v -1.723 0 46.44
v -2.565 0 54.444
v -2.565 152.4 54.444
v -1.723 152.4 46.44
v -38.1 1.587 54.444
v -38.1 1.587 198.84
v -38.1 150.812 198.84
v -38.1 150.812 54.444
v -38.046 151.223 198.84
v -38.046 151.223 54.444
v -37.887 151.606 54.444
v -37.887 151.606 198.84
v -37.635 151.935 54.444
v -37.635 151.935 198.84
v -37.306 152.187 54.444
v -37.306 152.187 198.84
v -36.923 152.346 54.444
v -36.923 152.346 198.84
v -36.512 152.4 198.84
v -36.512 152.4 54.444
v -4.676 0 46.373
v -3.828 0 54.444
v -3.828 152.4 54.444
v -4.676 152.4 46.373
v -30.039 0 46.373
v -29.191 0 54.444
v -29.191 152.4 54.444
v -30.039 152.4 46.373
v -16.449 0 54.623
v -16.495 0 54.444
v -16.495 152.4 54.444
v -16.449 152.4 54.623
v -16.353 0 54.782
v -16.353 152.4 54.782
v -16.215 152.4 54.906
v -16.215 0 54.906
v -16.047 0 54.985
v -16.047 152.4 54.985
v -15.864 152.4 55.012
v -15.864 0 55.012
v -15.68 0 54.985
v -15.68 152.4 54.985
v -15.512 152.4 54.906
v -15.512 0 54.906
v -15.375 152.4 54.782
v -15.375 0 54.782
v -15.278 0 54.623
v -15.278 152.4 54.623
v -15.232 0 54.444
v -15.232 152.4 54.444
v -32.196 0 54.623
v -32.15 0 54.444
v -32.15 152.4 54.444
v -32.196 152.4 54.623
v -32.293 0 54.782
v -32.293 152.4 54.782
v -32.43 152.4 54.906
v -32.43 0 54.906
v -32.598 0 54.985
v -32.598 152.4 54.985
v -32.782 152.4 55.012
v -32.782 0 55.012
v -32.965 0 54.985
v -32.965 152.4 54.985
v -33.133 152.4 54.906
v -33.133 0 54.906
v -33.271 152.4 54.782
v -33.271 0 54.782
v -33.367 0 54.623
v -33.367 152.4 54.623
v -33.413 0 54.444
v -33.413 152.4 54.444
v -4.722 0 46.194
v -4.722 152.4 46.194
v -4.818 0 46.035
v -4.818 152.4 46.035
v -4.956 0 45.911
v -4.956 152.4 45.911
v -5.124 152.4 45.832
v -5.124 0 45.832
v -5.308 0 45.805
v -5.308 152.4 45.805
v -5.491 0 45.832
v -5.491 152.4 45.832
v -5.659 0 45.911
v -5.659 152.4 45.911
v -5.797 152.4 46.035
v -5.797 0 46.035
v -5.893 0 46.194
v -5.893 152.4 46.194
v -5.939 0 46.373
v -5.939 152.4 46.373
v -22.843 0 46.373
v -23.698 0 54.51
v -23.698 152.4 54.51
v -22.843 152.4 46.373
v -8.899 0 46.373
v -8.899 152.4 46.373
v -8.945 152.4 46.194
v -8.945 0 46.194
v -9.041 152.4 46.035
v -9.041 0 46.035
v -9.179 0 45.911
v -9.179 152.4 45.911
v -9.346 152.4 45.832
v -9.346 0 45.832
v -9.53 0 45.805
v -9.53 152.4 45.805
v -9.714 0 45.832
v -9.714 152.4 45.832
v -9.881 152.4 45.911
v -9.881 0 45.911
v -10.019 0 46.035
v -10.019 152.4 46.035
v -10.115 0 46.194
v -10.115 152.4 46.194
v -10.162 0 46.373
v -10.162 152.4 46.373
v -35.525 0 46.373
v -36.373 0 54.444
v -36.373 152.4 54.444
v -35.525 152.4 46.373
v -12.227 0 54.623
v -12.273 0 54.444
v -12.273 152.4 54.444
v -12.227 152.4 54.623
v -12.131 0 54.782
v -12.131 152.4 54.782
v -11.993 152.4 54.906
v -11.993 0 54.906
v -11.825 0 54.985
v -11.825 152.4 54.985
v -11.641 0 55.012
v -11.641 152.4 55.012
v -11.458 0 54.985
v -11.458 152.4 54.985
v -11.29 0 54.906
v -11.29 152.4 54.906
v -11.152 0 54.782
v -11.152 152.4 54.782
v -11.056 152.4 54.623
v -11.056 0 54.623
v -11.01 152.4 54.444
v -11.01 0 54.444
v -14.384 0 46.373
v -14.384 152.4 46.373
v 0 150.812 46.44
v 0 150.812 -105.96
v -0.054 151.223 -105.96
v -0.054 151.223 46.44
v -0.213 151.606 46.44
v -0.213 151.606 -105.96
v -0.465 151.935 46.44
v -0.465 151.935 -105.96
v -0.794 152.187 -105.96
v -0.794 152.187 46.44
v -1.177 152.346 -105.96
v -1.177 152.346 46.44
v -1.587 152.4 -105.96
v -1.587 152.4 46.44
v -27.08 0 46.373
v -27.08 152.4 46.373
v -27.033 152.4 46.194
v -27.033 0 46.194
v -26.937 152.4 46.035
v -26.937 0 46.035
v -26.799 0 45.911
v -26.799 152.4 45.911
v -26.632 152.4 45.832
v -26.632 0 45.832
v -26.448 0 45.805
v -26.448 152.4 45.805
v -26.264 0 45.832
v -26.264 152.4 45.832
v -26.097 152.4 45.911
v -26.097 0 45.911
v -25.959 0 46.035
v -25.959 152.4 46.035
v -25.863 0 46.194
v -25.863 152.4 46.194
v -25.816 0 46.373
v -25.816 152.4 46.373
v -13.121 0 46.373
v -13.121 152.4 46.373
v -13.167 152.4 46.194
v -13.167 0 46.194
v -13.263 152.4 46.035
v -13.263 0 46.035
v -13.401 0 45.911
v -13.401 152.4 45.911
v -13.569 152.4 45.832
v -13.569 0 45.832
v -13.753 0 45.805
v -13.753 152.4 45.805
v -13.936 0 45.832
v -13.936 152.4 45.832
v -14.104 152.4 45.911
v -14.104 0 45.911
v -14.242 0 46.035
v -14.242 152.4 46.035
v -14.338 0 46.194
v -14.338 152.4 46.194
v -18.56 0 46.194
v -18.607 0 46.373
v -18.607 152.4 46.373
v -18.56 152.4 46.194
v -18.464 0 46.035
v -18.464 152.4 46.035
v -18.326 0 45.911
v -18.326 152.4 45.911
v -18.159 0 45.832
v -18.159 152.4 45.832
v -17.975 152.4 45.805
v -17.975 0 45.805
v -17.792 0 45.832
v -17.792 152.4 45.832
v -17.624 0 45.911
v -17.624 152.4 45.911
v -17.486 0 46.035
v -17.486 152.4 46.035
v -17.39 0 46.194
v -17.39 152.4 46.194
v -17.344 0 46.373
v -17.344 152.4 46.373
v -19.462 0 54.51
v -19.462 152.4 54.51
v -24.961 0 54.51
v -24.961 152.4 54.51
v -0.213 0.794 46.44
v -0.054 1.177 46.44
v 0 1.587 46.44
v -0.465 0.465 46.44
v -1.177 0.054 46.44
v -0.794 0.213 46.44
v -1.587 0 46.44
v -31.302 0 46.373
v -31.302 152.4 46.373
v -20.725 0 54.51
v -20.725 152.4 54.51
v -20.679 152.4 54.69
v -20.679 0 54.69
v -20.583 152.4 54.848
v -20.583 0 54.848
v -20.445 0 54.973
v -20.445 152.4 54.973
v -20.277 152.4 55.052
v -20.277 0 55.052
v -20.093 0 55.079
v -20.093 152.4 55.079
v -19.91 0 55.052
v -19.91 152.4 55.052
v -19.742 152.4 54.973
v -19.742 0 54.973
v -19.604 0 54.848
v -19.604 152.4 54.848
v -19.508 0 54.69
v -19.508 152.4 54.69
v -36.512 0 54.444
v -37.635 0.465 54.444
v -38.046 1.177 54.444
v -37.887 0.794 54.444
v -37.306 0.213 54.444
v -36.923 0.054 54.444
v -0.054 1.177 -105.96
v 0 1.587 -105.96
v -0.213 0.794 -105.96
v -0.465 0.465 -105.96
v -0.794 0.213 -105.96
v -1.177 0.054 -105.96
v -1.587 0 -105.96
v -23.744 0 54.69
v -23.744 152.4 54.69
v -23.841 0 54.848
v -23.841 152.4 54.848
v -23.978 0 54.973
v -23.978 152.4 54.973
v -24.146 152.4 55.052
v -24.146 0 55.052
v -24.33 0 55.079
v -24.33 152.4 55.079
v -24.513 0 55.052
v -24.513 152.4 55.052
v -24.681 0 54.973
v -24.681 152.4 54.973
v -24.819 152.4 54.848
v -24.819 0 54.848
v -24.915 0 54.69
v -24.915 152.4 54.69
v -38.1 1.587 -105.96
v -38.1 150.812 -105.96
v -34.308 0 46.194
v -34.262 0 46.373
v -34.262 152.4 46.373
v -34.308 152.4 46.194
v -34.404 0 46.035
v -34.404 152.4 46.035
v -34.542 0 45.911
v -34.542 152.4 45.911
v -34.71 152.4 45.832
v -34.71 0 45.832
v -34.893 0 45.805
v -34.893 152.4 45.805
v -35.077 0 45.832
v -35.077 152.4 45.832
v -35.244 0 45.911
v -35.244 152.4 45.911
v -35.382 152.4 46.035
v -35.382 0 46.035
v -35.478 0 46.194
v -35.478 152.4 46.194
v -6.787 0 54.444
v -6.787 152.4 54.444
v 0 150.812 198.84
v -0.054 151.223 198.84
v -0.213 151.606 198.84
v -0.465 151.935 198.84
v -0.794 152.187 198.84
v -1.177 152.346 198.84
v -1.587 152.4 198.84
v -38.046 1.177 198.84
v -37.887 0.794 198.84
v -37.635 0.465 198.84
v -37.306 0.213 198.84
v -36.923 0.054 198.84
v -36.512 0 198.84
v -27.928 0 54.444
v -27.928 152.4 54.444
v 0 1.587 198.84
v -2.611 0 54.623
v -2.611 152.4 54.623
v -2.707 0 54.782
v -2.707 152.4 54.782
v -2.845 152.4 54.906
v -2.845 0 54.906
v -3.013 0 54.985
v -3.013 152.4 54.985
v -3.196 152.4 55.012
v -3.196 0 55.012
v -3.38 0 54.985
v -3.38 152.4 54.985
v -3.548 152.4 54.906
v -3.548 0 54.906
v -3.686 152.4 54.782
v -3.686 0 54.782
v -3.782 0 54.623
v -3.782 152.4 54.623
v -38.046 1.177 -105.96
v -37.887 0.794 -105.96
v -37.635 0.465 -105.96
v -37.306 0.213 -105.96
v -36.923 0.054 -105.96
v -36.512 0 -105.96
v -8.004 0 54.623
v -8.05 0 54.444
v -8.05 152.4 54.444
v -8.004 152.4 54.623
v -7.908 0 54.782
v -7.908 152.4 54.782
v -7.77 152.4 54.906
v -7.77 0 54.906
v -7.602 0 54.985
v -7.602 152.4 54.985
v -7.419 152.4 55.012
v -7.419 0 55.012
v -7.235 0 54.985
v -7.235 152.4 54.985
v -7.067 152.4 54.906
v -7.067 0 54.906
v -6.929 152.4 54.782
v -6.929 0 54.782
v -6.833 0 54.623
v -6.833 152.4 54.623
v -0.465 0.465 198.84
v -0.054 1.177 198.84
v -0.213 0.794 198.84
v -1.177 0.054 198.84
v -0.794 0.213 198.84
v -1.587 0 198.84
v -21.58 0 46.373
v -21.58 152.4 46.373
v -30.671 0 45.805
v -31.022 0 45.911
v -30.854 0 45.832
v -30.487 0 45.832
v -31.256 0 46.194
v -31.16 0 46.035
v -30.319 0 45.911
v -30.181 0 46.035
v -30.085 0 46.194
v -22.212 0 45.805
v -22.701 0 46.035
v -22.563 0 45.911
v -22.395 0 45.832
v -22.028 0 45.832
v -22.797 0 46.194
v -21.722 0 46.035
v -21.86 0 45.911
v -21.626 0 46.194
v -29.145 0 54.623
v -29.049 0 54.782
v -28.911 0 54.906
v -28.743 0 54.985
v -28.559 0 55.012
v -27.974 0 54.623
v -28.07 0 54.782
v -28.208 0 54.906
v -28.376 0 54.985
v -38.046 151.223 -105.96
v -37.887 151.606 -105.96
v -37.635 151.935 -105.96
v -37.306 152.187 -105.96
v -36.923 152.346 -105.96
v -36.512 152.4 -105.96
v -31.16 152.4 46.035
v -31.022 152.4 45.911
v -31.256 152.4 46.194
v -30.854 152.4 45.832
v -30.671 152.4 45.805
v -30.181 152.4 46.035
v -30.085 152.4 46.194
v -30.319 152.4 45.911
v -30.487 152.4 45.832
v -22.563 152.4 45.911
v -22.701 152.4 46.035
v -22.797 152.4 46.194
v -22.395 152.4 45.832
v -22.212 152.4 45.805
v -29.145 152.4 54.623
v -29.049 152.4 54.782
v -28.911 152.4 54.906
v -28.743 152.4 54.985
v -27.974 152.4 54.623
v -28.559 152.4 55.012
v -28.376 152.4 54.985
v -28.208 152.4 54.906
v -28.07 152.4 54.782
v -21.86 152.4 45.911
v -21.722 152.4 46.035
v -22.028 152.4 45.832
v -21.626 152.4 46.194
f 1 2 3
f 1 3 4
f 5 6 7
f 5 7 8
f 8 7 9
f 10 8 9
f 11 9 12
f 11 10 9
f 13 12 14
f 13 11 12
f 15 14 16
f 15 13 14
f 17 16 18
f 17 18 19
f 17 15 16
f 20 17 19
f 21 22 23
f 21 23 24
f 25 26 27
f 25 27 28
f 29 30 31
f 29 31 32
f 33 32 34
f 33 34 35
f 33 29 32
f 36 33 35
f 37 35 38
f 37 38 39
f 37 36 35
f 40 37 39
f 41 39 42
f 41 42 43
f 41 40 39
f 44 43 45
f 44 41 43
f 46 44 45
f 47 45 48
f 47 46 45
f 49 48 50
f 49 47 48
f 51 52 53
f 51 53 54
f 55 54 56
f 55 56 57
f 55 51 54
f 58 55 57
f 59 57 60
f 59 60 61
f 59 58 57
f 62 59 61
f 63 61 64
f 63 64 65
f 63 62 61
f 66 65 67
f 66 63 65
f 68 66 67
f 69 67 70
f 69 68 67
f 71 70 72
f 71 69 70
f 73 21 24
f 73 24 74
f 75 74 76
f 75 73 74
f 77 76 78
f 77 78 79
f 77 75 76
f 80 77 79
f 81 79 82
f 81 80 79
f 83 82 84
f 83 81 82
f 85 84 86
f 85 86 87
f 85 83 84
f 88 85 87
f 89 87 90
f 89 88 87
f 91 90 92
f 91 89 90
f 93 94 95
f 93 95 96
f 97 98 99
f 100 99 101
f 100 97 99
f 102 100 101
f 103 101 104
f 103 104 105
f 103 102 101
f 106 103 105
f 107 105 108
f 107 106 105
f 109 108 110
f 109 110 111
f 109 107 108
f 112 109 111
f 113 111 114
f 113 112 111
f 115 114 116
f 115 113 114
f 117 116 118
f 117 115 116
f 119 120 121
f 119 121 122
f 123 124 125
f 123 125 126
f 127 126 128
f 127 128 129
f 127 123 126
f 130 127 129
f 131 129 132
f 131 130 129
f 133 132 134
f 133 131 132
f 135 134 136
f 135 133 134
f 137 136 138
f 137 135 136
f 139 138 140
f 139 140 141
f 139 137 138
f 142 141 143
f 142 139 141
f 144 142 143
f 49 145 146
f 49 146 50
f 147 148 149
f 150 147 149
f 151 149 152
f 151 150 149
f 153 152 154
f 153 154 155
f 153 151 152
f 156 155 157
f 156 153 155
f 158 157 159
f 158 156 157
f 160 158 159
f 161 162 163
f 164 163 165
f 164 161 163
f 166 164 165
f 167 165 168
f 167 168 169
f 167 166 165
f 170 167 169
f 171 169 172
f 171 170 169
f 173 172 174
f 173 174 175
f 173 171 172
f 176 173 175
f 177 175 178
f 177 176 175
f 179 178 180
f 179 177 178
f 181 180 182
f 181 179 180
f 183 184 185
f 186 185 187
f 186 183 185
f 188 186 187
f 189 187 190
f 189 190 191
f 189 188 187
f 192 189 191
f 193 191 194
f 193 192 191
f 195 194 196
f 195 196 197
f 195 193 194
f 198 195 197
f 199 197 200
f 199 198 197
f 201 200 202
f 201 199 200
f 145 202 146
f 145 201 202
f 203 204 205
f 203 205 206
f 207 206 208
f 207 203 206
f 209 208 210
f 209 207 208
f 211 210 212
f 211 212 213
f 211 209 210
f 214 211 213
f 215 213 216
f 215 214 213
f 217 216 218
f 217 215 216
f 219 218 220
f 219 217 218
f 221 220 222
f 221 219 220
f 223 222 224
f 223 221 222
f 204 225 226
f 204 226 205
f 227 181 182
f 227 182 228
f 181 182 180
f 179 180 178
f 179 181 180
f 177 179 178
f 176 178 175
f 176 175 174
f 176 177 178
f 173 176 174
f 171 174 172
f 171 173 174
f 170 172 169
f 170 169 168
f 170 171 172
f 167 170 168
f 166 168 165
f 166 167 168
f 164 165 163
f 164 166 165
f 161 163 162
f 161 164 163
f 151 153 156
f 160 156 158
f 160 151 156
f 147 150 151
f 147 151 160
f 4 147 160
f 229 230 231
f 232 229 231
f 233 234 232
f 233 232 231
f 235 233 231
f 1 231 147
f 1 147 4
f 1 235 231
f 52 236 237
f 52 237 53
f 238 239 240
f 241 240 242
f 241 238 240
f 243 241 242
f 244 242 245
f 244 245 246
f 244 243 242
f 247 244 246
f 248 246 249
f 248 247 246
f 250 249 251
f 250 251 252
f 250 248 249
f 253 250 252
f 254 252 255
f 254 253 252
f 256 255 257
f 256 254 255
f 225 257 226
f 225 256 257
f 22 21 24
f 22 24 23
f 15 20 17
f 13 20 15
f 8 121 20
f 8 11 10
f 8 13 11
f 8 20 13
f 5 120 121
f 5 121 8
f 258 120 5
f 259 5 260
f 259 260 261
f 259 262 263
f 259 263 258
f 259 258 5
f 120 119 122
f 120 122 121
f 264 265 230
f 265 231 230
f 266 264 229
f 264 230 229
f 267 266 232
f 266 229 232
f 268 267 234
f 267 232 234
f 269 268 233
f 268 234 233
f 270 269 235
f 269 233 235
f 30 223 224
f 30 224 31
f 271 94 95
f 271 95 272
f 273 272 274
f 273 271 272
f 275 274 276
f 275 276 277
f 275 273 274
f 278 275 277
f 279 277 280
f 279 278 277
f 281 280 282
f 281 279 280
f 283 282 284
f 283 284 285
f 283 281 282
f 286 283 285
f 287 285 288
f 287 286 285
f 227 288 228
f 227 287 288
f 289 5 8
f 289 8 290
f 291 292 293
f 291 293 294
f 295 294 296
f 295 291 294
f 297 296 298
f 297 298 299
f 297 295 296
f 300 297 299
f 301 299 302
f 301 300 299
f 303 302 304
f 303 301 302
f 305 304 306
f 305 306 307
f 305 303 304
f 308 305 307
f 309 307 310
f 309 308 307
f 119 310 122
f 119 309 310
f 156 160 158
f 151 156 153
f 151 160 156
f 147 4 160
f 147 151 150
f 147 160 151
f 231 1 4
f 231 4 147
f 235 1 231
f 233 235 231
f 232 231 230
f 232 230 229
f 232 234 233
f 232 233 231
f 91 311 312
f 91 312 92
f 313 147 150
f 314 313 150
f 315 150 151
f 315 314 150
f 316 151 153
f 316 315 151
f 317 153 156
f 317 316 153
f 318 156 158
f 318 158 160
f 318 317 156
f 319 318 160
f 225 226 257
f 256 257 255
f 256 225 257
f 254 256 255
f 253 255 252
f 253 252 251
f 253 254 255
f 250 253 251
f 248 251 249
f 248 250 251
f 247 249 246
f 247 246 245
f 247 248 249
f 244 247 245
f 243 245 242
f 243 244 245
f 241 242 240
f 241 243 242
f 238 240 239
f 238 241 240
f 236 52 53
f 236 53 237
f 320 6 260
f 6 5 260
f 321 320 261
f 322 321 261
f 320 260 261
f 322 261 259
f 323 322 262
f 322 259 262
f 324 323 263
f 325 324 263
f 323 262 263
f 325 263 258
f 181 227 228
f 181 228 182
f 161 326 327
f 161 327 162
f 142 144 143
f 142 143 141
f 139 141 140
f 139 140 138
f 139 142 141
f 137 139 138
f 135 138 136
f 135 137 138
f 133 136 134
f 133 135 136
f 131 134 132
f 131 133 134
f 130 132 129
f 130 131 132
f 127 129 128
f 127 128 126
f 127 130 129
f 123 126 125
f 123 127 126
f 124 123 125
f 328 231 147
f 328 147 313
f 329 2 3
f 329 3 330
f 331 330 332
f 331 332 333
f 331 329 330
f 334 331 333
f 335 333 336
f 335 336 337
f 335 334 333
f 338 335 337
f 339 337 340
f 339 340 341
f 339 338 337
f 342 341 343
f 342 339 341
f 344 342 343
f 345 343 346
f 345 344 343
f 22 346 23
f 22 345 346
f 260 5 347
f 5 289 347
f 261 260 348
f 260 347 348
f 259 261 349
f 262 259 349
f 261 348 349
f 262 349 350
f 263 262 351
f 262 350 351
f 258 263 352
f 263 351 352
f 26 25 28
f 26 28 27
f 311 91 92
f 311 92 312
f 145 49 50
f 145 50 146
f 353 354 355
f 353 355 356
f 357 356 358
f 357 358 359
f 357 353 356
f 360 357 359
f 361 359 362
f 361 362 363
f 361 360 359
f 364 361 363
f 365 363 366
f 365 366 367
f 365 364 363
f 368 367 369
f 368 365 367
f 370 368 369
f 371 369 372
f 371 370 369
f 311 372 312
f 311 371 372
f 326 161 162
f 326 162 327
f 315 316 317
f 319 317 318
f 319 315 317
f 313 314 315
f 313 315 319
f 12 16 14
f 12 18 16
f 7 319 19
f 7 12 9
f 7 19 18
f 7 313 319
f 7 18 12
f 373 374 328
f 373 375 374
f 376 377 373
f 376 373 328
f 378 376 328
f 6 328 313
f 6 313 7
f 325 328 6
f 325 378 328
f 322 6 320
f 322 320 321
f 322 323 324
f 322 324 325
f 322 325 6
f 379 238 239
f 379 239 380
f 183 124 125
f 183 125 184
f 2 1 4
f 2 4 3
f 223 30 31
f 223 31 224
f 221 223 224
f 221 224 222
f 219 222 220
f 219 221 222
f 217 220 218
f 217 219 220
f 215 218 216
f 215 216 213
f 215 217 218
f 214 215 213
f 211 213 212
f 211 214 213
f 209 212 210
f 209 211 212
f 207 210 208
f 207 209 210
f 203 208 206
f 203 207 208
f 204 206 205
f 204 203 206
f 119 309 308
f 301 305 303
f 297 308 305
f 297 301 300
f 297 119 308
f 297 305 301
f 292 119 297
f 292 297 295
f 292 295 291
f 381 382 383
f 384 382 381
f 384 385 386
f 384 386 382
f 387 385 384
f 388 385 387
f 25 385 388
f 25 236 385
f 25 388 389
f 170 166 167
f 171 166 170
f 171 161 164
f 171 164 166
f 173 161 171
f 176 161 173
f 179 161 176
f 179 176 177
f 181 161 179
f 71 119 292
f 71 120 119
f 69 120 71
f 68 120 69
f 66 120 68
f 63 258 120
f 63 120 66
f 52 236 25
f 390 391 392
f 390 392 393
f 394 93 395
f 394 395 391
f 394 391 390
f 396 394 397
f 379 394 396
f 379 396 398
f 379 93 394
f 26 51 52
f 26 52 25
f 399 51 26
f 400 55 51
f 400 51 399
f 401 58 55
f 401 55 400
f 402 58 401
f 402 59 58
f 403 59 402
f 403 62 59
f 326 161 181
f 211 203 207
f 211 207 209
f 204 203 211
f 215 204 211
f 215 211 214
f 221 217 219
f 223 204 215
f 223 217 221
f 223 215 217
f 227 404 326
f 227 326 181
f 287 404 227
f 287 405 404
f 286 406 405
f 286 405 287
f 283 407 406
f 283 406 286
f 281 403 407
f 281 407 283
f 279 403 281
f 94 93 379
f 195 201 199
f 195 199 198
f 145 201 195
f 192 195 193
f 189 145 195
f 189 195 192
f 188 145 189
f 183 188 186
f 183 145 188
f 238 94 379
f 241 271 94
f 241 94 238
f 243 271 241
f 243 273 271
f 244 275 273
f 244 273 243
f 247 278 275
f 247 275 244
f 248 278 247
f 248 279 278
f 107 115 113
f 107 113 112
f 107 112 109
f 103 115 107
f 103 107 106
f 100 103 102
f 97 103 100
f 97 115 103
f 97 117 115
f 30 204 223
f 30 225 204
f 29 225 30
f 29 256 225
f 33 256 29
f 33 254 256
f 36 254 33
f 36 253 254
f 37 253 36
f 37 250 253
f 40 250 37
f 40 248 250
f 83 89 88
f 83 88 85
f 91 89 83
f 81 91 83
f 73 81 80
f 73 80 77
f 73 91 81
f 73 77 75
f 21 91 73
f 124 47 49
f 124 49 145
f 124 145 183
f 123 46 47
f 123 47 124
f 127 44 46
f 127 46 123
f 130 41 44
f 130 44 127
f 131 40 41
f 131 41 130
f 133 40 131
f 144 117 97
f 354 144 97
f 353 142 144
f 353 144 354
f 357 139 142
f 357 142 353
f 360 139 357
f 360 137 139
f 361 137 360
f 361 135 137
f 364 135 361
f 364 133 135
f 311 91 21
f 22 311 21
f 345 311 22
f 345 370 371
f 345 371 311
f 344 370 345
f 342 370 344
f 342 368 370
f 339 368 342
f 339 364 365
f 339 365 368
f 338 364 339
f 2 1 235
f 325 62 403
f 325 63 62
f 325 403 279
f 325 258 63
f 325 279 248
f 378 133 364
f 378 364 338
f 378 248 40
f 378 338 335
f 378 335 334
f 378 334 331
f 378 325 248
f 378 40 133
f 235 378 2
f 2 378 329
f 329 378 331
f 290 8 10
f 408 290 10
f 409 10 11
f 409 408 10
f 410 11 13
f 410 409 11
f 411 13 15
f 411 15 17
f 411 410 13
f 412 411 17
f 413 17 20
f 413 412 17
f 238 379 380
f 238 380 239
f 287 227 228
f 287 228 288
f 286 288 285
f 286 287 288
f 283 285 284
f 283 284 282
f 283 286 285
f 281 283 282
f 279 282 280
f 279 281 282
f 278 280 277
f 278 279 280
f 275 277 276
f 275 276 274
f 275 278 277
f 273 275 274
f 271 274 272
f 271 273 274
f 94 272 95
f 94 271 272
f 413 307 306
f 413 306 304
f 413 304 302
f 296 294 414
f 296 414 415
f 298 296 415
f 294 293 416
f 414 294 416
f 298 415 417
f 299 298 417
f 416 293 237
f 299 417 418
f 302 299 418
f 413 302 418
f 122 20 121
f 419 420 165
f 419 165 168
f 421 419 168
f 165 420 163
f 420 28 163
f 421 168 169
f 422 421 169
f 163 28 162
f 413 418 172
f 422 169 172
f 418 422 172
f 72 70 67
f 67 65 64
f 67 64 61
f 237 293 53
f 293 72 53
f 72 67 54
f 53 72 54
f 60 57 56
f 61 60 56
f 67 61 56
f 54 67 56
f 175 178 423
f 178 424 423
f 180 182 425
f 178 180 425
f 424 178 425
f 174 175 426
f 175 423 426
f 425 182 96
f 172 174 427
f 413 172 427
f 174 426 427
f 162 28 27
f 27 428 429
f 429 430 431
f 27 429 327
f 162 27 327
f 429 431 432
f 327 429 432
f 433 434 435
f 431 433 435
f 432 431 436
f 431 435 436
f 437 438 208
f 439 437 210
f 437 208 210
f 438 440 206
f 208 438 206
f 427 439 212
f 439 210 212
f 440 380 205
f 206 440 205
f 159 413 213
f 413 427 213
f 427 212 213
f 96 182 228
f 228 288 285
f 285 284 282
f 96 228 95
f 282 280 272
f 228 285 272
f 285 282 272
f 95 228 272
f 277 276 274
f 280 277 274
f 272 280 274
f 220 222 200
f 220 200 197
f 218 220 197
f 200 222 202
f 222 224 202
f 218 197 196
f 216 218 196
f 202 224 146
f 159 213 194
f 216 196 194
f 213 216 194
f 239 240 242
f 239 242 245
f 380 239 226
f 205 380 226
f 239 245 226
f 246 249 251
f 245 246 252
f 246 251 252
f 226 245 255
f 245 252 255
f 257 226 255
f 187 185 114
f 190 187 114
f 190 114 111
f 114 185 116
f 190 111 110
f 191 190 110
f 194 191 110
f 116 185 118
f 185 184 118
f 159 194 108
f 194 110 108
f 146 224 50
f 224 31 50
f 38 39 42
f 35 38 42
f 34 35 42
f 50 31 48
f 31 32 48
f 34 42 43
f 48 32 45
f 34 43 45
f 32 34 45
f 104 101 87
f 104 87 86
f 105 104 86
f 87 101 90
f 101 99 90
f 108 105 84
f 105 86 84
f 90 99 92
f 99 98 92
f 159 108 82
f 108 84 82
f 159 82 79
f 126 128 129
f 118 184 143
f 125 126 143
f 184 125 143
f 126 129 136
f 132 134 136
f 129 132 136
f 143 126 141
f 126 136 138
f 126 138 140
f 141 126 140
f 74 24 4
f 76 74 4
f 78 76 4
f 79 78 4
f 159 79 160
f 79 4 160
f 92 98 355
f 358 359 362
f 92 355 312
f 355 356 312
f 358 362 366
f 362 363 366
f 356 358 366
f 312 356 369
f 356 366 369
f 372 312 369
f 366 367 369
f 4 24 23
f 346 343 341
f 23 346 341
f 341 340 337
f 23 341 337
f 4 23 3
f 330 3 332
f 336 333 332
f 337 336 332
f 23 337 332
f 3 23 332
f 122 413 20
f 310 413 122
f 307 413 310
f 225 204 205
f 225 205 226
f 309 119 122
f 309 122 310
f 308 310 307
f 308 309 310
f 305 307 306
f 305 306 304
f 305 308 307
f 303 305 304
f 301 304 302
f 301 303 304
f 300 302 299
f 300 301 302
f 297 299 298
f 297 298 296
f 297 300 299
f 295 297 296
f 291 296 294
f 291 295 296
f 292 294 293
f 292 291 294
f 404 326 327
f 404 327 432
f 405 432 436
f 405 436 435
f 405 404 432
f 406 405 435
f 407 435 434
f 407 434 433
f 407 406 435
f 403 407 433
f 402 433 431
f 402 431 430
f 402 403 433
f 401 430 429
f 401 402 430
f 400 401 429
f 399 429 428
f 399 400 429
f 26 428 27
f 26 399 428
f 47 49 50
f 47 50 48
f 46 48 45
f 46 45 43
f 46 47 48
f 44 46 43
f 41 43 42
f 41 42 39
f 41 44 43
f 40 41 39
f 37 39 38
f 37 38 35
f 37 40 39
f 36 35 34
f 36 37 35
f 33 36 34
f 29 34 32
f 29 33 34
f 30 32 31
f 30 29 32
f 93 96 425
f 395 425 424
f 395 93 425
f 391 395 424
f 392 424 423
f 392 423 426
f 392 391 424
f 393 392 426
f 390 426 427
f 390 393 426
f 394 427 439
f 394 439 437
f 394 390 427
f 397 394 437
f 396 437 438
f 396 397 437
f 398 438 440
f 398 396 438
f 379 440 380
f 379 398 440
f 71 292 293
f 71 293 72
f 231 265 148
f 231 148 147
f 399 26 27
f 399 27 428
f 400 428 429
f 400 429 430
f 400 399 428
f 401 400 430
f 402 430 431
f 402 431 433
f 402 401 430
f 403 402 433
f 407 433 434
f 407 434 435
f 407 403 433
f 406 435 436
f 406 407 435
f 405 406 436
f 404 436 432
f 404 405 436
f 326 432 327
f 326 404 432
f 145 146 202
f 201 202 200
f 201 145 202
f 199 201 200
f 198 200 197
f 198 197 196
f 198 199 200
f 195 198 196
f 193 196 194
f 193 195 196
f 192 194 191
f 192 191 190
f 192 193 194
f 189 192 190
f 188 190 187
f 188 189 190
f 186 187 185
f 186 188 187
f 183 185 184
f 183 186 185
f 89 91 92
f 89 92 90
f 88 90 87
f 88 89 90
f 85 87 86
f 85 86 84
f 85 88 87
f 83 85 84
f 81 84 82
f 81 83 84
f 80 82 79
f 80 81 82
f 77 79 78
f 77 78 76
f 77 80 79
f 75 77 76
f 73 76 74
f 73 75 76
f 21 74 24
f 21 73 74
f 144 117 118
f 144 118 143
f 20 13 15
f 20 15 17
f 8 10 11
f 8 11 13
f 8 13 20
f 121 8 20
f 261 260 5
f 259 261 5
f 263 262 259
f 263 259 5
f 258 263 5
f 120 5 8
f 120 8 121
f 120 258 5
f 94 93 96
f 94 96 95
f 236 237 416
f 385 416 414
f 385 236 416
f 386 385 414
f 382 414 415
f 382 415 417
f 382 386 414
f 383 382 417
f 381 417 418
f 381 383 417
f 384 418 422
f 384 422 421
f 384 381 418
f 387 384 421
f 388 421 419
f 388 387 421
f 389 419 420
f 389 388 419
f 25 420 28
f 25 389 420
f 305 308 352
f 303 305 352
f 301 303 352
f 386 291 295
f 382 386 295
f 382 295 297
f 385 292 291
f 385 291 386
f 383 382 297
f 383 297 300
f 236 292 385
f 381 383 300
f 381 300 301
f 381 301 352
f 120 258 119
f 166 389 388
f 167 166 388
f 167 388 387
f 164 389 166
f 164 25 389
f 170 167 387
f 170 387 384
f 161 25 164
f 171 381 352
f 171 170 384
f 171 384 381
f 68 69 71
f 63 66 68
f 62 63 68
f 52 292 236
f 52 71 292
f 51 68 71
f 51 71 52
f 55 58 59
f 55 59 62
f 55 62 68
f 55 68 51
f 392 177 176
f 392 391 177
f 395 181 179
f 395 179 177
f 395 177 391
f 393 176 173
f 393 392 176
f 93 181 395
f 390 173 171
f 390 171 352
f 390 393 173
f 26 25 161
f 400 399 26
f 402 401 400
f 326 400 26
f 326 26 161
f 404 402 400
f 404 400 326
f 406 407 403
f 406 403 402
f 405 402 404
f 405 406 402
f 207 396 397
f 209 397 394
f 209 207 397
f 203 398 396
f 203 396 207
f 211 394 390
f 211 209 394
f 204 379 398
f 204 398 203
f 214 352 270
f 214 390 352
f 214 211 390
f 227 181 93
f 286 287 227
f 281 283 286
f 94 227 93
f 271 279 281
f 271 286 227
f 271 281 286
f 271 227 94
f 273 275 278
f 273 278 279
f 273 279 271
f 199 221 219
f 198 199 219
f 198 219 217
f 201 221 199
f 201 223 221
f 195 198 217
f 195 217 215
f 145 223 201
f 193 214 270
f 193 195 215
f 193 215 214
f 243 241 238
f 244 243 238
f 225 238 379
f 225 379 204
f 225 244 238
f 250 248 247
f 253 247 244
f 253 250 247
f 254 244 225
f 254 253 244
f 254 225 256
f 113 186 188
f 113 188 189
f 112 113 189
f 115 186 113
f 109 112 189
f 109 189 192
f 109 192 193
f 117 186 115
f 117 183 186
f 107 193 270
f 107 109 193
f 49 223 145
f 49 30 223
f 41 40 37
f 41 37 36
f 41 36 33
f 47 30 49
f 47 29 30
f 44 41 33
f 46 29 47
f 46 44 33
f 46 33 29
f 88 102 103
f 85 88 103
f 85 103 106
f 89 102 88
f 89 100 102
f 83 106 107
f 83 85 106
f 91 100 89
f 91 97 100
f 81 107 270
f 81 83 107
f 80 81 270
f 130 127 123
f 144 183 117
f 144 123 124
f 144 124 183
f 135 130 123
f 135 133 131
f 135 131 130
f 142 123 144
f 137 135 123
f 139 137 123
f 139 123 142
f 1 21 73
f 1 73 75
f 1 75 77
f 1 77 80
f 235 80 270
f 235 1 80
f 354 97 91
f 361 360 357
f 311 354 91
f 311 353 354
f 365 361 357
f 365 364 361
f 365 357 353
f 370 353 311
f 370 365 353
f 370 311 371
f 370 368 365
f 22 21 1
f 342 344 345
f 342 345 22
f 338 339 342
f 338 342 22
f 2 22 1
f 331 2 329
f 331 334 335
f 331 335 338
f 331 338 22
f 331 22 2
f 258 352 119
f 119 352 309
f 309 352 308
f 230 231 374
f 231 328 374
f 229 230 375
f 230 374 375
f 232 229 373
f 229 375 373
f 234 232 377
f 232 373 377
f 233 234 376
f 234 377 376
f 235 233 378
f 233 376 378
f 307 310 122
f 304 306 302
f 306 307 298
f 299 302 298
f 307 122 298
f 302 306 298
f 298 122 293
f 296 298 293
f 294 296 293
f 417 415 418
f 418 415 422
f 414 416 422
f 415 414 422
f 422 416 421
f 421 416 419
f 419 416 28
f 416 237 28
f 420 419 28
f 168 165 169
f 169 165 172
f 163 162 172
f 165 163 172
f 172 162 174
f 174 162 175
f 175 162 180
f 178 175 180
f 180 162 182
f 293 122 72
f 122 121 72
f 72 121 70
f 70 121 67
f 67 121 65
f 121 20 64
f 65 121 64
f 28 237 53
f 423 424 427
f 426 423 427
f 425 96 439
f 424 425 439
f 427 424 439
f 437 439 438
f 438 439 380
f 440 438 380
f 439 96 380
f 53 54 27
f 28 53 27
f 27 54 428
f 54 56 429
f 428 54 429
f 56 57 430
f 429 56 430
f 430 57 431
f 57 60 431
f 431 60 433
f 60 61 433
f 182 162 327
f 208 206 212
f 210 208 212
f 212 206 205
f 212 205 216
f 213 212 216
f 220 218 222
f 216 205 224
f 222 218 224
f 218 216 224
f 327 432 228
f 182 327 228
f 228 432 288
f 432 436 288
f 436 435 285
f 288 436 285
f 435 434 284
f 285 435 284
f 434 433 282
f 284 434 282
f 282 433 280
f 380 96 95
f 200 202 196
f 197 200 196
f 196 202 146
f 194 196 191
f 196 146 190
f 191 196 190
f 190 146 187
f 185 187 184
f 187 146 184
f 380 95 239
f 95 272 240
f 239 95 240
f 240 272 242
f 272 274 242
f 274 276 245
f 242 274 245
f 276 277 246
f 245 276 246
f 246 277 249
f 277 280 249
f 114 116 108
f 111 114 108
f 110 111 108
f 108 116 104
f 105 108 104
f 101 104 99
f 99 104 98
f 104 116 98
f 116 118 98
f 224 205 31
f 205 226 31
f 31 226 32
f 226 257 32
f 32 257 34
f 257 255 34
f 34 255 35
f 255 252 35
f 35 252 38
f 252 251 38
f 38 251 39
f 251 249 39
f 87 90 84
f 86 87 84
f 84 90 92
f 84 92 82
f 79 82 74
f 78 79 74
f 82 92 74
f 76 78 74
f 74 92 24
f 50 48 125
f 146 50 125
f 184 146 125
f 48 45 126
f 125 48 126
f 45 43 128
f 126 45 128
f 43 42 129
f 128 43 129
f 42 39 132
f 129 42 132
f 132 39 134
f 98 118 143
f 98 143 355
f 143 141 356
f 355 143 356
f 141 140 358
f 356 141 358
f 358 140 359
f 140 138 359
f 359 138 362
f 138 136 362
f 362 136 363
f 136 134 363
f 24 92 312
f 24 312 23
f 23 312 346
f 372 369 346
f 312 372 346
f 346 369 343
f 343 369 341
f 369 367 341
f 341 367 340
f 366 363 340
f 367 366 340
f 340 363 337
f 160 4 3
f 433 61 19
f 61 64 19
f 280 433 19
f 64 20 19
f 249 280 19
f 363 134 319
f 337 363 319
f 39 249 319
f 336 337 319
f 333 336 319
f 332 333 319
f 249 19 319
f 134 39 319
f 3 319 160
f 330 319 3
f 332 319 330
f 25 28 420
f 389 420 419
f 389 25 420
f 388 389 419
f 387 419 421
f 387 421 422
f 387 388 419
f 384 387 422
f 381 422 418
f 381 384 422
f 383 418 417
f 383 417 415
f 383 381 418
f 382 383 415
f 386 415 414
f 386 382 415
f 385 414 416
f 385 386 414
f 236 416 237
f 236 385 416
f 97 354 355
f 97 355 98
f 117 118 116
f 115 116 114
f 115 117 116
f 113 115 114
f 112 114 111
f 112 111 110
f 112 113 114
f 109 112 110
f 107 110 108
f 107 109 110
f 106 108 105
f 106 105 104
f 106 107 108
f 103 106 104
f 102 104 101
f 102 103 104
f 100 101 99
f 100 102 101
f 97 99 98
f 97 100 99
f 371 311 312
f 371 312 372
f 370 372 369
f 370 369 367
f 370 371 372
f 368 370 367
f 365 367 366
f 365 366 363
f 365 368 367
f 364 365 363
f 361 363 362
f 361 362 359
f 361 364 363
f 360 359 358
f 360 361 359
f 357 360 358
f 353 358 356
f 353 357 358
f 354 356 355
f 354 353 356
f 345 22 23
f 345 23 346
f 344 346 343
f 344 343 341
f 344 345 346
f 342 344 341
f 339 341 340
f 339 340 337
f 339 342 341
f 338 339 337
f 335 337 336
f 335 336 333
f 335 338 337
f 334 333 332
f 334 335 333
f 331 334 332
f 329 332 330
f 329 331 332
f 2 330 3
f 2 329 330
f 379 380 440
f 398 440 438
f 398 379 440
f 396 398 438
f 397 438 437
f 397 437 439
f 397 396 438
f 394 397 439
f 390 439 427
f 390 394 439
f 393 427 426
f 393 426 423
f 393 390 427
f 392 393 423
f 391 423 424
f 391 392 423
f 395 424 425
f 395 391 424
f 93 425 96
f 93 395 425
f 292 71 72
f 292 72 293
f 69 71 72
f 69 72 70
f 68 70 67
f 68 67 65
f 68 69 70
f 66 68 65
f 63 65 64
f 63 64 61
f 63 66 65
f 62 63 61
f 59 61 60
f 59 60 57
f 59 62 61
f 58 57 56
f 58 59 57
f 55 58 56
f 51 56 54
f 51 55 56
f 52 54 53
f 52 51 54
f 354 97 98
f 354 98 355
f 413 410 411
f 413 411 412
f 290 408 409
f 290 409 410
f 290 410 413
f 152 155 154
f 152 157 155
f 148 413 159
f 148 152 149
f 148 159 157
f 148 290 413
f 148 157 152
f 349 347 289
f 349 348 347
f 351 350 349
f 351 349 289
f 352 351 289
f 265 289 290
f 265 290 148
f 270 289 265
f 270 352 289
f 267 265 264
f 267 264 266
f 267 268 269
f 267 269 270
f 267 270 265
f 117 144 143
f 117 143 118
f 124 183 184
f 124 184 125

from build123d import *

# Parameters (mm, degrees)
F1_DEPTH = 152.4
F2_DEPTH = 152.4
F3_R     = 1.5875
F3_2_R   = 1.5875


with BuildPart() as f1:
    # F0 (on Front) → F1 (new body)
    with BuildSketch(Plane.XZ):
        with BuildLine():
            Line((0, 198.8398526046), (-38.1, 198.8398526046))
            Line((-38.1, 198.8398526046), (-38.1, 54.4437281787))
            Line((-38.1, 54.4437281787), (-36.3728, 54.4437281787))
            Line((-36.3728, 54.4437281787), (-35.5245824247, 46.3734770304))
            ThreePointArc((-35.5245824247, 46.3734770304), (-34.8930610211, 45.8048526046), (-34.2615396175, 46.3734770304))
            Line((-34.2615396175, 46.3734770304), (-33.4133220422, 54.4437281787))
            ThreePointArc((-33.4133220422, 54.4437281787), (-32.7818006386, 55.0123526046), (-32.1502792351, 54.4437281787))
            Line((-32.1502792351, 54.4437281787), (-31.3020616597, 46.3734770304))
            ThreePointArc((-31.3020616597, 46.3734770304), (-30.6705402562, 45.8048526046), (-30.0390188526, 46.3734770304))
            Line((-30.0390188526, 46.3734770304), (-29.1908012772, 54.4437281787))
            ThreePointArc((-29.1908012772, 54.4437281787), (-28.5592798737, 55.0123526046), (-27.9277584701, 54.4437281787))
            Line((-27.9277584701, 54.4437281787), (-27.0795408948, 46.3734770304))
            ThreePointArc((-27.0795408948, 46.3734770304), (-26.4480194912, 45.8048526046), (-25.8164980877, 46.3734770304))
            Line((-25.8164980877, 46.3734770304), (-24.9613041584, 54.5101037529))
            ThreePointArc((-24.9613041584, 54.5101037529), (-24.3297827548, 55.0787281787), (-23.6982613512, 54.5101037529))
            Line((-23.6982613512, 54.5101037529), (-22.8430674219, 46.3734770304))
            ThreePointArc((-22.8430674219, 46.3734770304), (-22.2115460184, 45.8048526046), (-21.5800246148, 46.3734770304))
            Line((-21.5800246148, 46.3734770304), (-20.7248306855, 54.5101037529))
            ThreePointArc((-20.7248306855, 54.5101037529), (-20.0933092819, 55.0787281787), (-19.4617878784, 54.5101037529))
            Line((-19.4617878784, 54.5101037529), (-18.6065939491, 46.3734770304))
            ThreePointArc((-18.6065939491, 46.3734770304), (-17.9750725455, 45.8048526046), (-17.3435511419, 46.3734770304))
            Line((-17.3435511419, 46.3734770304), (-16.4953335666, 54.4437281787))
            ThreePointArc((-16.4953335666, 54.4437281787), (-15.863812163, 55.0123526046), (-15.2322907595, 54.4437281787))
            Line((-15.2322907595, 54.4437281787), (-14.3840731841, 46.3734770304))
            ThreePointArc((-14.3840731841, 46.3734770304), (-13.7525517806, 45.8048526046), (-13.121030377, 46.3734770304))
            Line((-13.121030377, 46.3734770304), (-12.2728128017, 54.4437281787))
            ThreePointArc((-12.2728128017, 54.4437281787), (-11.6412913981, 55.0123526046), (-11.0097699945, 54.4437281787))
            Line((-11.0097699945, 54.4437281787), (-10.1615524192, 46.3734770304))
            ThreePointArc((-10.1615524192, 46.3734770304), (-9.5300310156, 45.8048526046), (-8.8985096121, 46.3734770304))
            Line((-8.8985096121, 46.3734770304), (-8.0502920367, 54.4437281787))
            ThreePointArc((-8.0502920367, 54.4437281787), (-7.4187706332, 55.0123526046), (-6.7872492296, 54.4437281787))
            Line((-6.7872492296, 54.4437281787), (-5.9390316543, 46.3734770304))
            ThreePointArc((-5.9390316543, 46.3734770304), (-5.3075102507, 45.8048526046), (-4.6759888471, 46.3734770304))
            Line((-4.6759888471, 46.3734770304), (-3.8277712718, 54.4437281787))
            ThreePointArc((-3.8277712718, 54.4437281787), (-3.1962498682, 55.0123526046), (-2.5647284647, 54.4437281787))
            Line((-2.5647284647, 54.4437281787), (-1.7234872433, 46.4398526046))
            Line((-1.7234872433, 46.4398526046), (0, 46.4398526046))
            Line((0, 46.4398526046), (0, 198.8398526046))
        make_face()
    extrude(amount=-F1_DEPTH)

    # F3
    f3_edges = [f1.edges().sort_by_distance(p)[0] for p in [
        (-38.1, 0, 126.64179),
        (0, 0, 122.639853),
        (0, 152.4, 122.639853),
        (-38.1, 152.4, 126.64179),
    ]]
    fillet(f3_edges, radius=F3_R)


with BuildPart() as f2:
    # F0 (on Front) → F2 (new body)
    with BuildSketch(Plane.XZ):
        with BuildLine():
            Line((-36.3728, 54.4437281787), (-38.1, 54.4437281787))
            Line((-38.1, 54.4437281787), (-38.1, -105.9601473954))
            Line((-38.1, -105.9601473954), (0, -105.9601473954))
            Line((0, -105.9601473954), (0, 46.4398526046))
            Line((0, 46.4398526046), (-1.7234872433, 46.4398526046))
            Line((-1.7234872433, 46.4398526046), (-2.5647284647, 54.4437281787))
            ThreePointArc((-2.5647284647, 54.4437281787), (-3.1962498682, 55.0123526046), (-3.8277712718, 54.4437281787))
            Line((-3.8277712718, 54.4437281787), (-4.6759888471, 46.3734770304))
            ThreePointArc((-4.6759888471, 46.3734770304), (-5.3075102507, 45.8048526046), (-5.9390316543, 46.3734770304))
            Line((-5.9390316543, 46.3734770304), (-6.7872492296, 54.4437281787))
            ThreePointArc((-6.7872492296, 54.4437281787), (-7.4187706332, 55.0123526046), (-8.0502920367, 54.4437281787))
            Line((-8.0502920367, 54.4437281787), (-8.8985096121, 46.3734770304))
            ThreePointArc((-8.8985096121, 46.3734770304), (-9.5300310156, 45.8048526046), (-10.1615524192, 46.3734770304))
            Line((-10.1615524192, 46.3734770304), (-11.0097699945, 54.4437281787))
            ThreePointArc((-11.0097699945, 54.4437281787), (-11.6412913981, 55.0123526046), (-12.2728128017, 54.4437281787))
            Line((-12.2728128017, 54.4437281787), (-13.121030377, 46.3734770304))
            ThreePointArc((-13.121030377, 46.3734770304), (-13.7525517806, 45.8048526046), (-14.3840731841, 46.3734770304))
            Line((-14.3840731841, 46.3734770304), (-15.2322907595, 54.4437281787))
            ThreePointArc((-15.2322907595, 54.4437281787), (-15.863812163, 55.0123526046), (-16.4953335666, 54.4437281787))
            Line((-16.4953335666, 54.4437281787), (-17.3435511419, 46.3734770304))
            ThreePointArc((-17.3435511419, 46.3734770304), (-17.9750725455, 45.8048526046), (-18.6065939491, 46.3734770304))
            Line((-18.6065939491, 46.3734770304), (-19.4617878784, 54.5101037529))
            ThreePointArc((-19.4617878784, 54.5101037529), (-20.0933092819, 55.0787281787), (-20.7248306855, 54.5101037529))
            Line((-20.7248306855, 54.5101037529), (-21.5800246148, 46.3734770304))
            ThreePointArc((-21.5800246148, 46.3734770304), (-22.2115460184, 45.8048526046), (-22.8430674219, 46.3734770304))
            Line((-22.8430674219, 46.3734770304), (-23.6982613512, 54.5101037529))
            ThreePointArc((-23.6982613512, 54.5101037529), (-24.3297827548, 55.0787281787), (-24.9613041584, 54.5101037529))
            Line((-24.9613041584, 54.5101037529), (-25.8164980877, 46.3734770304))
            ThreePointArc((-25.8164980877, 46.3734770304), (-26.4480194912, 45.8048526046), (-27.0795408948, 46.3734770304))
            Line((-27.0795408948, 46.3734770304), (-27.9277584701, 54.4437281787))
            ThreePointArc((-27.9277584701, 54.4437281787), (-28.5592798737, 55.0123526046), (-29.1908012772, 54.4437281787))
            Line((-29.1908012772, 54.4437281787), (-30.0390188526, 46.3734770304))
            ThreePointArc((-30.0390188526, 46.3734770304), (-30.6705402562, 45.8048526046), (-31.3020616597, 46.3734770304))
            Line((-31.3020616597, 46.3734770304), (-32.1502792351, 54.4437281787))
            ThreePointArc((-32.1502792351, 54.4437281787), (-32.7818006386, 55.0123526046), (-33.4133220422, 54.4437281787))
            Line((-33.4133220422, 54.4437281787), (-34.2615396175, 46.3734770304))
            ThreePointArc((-34.2615396175, 46.3734770304), (-34.8930610211, 45.8048526046), (-35.5245824247, 46.3734770304))
            Line((-35.5245824247, 46.3734770304), (-36.3728, 54.4437281787))
        make_face()
    extrude(amount=-F2_DEPTH)

    # F3#2
    f3_2_edges = [f2.edges().sort_by_distance(p)[0] for p in [
        (-38.1, 0, -25.75821),
        (0, 0, -29.760147),
        (0, 152.4, -29.760147),
        (-38.1, 152.4, -25.75821),
    ]]
    fillet(f3_2_edges, radius=F3_2_R)


solid = Compound([f1.part, f2.part])
